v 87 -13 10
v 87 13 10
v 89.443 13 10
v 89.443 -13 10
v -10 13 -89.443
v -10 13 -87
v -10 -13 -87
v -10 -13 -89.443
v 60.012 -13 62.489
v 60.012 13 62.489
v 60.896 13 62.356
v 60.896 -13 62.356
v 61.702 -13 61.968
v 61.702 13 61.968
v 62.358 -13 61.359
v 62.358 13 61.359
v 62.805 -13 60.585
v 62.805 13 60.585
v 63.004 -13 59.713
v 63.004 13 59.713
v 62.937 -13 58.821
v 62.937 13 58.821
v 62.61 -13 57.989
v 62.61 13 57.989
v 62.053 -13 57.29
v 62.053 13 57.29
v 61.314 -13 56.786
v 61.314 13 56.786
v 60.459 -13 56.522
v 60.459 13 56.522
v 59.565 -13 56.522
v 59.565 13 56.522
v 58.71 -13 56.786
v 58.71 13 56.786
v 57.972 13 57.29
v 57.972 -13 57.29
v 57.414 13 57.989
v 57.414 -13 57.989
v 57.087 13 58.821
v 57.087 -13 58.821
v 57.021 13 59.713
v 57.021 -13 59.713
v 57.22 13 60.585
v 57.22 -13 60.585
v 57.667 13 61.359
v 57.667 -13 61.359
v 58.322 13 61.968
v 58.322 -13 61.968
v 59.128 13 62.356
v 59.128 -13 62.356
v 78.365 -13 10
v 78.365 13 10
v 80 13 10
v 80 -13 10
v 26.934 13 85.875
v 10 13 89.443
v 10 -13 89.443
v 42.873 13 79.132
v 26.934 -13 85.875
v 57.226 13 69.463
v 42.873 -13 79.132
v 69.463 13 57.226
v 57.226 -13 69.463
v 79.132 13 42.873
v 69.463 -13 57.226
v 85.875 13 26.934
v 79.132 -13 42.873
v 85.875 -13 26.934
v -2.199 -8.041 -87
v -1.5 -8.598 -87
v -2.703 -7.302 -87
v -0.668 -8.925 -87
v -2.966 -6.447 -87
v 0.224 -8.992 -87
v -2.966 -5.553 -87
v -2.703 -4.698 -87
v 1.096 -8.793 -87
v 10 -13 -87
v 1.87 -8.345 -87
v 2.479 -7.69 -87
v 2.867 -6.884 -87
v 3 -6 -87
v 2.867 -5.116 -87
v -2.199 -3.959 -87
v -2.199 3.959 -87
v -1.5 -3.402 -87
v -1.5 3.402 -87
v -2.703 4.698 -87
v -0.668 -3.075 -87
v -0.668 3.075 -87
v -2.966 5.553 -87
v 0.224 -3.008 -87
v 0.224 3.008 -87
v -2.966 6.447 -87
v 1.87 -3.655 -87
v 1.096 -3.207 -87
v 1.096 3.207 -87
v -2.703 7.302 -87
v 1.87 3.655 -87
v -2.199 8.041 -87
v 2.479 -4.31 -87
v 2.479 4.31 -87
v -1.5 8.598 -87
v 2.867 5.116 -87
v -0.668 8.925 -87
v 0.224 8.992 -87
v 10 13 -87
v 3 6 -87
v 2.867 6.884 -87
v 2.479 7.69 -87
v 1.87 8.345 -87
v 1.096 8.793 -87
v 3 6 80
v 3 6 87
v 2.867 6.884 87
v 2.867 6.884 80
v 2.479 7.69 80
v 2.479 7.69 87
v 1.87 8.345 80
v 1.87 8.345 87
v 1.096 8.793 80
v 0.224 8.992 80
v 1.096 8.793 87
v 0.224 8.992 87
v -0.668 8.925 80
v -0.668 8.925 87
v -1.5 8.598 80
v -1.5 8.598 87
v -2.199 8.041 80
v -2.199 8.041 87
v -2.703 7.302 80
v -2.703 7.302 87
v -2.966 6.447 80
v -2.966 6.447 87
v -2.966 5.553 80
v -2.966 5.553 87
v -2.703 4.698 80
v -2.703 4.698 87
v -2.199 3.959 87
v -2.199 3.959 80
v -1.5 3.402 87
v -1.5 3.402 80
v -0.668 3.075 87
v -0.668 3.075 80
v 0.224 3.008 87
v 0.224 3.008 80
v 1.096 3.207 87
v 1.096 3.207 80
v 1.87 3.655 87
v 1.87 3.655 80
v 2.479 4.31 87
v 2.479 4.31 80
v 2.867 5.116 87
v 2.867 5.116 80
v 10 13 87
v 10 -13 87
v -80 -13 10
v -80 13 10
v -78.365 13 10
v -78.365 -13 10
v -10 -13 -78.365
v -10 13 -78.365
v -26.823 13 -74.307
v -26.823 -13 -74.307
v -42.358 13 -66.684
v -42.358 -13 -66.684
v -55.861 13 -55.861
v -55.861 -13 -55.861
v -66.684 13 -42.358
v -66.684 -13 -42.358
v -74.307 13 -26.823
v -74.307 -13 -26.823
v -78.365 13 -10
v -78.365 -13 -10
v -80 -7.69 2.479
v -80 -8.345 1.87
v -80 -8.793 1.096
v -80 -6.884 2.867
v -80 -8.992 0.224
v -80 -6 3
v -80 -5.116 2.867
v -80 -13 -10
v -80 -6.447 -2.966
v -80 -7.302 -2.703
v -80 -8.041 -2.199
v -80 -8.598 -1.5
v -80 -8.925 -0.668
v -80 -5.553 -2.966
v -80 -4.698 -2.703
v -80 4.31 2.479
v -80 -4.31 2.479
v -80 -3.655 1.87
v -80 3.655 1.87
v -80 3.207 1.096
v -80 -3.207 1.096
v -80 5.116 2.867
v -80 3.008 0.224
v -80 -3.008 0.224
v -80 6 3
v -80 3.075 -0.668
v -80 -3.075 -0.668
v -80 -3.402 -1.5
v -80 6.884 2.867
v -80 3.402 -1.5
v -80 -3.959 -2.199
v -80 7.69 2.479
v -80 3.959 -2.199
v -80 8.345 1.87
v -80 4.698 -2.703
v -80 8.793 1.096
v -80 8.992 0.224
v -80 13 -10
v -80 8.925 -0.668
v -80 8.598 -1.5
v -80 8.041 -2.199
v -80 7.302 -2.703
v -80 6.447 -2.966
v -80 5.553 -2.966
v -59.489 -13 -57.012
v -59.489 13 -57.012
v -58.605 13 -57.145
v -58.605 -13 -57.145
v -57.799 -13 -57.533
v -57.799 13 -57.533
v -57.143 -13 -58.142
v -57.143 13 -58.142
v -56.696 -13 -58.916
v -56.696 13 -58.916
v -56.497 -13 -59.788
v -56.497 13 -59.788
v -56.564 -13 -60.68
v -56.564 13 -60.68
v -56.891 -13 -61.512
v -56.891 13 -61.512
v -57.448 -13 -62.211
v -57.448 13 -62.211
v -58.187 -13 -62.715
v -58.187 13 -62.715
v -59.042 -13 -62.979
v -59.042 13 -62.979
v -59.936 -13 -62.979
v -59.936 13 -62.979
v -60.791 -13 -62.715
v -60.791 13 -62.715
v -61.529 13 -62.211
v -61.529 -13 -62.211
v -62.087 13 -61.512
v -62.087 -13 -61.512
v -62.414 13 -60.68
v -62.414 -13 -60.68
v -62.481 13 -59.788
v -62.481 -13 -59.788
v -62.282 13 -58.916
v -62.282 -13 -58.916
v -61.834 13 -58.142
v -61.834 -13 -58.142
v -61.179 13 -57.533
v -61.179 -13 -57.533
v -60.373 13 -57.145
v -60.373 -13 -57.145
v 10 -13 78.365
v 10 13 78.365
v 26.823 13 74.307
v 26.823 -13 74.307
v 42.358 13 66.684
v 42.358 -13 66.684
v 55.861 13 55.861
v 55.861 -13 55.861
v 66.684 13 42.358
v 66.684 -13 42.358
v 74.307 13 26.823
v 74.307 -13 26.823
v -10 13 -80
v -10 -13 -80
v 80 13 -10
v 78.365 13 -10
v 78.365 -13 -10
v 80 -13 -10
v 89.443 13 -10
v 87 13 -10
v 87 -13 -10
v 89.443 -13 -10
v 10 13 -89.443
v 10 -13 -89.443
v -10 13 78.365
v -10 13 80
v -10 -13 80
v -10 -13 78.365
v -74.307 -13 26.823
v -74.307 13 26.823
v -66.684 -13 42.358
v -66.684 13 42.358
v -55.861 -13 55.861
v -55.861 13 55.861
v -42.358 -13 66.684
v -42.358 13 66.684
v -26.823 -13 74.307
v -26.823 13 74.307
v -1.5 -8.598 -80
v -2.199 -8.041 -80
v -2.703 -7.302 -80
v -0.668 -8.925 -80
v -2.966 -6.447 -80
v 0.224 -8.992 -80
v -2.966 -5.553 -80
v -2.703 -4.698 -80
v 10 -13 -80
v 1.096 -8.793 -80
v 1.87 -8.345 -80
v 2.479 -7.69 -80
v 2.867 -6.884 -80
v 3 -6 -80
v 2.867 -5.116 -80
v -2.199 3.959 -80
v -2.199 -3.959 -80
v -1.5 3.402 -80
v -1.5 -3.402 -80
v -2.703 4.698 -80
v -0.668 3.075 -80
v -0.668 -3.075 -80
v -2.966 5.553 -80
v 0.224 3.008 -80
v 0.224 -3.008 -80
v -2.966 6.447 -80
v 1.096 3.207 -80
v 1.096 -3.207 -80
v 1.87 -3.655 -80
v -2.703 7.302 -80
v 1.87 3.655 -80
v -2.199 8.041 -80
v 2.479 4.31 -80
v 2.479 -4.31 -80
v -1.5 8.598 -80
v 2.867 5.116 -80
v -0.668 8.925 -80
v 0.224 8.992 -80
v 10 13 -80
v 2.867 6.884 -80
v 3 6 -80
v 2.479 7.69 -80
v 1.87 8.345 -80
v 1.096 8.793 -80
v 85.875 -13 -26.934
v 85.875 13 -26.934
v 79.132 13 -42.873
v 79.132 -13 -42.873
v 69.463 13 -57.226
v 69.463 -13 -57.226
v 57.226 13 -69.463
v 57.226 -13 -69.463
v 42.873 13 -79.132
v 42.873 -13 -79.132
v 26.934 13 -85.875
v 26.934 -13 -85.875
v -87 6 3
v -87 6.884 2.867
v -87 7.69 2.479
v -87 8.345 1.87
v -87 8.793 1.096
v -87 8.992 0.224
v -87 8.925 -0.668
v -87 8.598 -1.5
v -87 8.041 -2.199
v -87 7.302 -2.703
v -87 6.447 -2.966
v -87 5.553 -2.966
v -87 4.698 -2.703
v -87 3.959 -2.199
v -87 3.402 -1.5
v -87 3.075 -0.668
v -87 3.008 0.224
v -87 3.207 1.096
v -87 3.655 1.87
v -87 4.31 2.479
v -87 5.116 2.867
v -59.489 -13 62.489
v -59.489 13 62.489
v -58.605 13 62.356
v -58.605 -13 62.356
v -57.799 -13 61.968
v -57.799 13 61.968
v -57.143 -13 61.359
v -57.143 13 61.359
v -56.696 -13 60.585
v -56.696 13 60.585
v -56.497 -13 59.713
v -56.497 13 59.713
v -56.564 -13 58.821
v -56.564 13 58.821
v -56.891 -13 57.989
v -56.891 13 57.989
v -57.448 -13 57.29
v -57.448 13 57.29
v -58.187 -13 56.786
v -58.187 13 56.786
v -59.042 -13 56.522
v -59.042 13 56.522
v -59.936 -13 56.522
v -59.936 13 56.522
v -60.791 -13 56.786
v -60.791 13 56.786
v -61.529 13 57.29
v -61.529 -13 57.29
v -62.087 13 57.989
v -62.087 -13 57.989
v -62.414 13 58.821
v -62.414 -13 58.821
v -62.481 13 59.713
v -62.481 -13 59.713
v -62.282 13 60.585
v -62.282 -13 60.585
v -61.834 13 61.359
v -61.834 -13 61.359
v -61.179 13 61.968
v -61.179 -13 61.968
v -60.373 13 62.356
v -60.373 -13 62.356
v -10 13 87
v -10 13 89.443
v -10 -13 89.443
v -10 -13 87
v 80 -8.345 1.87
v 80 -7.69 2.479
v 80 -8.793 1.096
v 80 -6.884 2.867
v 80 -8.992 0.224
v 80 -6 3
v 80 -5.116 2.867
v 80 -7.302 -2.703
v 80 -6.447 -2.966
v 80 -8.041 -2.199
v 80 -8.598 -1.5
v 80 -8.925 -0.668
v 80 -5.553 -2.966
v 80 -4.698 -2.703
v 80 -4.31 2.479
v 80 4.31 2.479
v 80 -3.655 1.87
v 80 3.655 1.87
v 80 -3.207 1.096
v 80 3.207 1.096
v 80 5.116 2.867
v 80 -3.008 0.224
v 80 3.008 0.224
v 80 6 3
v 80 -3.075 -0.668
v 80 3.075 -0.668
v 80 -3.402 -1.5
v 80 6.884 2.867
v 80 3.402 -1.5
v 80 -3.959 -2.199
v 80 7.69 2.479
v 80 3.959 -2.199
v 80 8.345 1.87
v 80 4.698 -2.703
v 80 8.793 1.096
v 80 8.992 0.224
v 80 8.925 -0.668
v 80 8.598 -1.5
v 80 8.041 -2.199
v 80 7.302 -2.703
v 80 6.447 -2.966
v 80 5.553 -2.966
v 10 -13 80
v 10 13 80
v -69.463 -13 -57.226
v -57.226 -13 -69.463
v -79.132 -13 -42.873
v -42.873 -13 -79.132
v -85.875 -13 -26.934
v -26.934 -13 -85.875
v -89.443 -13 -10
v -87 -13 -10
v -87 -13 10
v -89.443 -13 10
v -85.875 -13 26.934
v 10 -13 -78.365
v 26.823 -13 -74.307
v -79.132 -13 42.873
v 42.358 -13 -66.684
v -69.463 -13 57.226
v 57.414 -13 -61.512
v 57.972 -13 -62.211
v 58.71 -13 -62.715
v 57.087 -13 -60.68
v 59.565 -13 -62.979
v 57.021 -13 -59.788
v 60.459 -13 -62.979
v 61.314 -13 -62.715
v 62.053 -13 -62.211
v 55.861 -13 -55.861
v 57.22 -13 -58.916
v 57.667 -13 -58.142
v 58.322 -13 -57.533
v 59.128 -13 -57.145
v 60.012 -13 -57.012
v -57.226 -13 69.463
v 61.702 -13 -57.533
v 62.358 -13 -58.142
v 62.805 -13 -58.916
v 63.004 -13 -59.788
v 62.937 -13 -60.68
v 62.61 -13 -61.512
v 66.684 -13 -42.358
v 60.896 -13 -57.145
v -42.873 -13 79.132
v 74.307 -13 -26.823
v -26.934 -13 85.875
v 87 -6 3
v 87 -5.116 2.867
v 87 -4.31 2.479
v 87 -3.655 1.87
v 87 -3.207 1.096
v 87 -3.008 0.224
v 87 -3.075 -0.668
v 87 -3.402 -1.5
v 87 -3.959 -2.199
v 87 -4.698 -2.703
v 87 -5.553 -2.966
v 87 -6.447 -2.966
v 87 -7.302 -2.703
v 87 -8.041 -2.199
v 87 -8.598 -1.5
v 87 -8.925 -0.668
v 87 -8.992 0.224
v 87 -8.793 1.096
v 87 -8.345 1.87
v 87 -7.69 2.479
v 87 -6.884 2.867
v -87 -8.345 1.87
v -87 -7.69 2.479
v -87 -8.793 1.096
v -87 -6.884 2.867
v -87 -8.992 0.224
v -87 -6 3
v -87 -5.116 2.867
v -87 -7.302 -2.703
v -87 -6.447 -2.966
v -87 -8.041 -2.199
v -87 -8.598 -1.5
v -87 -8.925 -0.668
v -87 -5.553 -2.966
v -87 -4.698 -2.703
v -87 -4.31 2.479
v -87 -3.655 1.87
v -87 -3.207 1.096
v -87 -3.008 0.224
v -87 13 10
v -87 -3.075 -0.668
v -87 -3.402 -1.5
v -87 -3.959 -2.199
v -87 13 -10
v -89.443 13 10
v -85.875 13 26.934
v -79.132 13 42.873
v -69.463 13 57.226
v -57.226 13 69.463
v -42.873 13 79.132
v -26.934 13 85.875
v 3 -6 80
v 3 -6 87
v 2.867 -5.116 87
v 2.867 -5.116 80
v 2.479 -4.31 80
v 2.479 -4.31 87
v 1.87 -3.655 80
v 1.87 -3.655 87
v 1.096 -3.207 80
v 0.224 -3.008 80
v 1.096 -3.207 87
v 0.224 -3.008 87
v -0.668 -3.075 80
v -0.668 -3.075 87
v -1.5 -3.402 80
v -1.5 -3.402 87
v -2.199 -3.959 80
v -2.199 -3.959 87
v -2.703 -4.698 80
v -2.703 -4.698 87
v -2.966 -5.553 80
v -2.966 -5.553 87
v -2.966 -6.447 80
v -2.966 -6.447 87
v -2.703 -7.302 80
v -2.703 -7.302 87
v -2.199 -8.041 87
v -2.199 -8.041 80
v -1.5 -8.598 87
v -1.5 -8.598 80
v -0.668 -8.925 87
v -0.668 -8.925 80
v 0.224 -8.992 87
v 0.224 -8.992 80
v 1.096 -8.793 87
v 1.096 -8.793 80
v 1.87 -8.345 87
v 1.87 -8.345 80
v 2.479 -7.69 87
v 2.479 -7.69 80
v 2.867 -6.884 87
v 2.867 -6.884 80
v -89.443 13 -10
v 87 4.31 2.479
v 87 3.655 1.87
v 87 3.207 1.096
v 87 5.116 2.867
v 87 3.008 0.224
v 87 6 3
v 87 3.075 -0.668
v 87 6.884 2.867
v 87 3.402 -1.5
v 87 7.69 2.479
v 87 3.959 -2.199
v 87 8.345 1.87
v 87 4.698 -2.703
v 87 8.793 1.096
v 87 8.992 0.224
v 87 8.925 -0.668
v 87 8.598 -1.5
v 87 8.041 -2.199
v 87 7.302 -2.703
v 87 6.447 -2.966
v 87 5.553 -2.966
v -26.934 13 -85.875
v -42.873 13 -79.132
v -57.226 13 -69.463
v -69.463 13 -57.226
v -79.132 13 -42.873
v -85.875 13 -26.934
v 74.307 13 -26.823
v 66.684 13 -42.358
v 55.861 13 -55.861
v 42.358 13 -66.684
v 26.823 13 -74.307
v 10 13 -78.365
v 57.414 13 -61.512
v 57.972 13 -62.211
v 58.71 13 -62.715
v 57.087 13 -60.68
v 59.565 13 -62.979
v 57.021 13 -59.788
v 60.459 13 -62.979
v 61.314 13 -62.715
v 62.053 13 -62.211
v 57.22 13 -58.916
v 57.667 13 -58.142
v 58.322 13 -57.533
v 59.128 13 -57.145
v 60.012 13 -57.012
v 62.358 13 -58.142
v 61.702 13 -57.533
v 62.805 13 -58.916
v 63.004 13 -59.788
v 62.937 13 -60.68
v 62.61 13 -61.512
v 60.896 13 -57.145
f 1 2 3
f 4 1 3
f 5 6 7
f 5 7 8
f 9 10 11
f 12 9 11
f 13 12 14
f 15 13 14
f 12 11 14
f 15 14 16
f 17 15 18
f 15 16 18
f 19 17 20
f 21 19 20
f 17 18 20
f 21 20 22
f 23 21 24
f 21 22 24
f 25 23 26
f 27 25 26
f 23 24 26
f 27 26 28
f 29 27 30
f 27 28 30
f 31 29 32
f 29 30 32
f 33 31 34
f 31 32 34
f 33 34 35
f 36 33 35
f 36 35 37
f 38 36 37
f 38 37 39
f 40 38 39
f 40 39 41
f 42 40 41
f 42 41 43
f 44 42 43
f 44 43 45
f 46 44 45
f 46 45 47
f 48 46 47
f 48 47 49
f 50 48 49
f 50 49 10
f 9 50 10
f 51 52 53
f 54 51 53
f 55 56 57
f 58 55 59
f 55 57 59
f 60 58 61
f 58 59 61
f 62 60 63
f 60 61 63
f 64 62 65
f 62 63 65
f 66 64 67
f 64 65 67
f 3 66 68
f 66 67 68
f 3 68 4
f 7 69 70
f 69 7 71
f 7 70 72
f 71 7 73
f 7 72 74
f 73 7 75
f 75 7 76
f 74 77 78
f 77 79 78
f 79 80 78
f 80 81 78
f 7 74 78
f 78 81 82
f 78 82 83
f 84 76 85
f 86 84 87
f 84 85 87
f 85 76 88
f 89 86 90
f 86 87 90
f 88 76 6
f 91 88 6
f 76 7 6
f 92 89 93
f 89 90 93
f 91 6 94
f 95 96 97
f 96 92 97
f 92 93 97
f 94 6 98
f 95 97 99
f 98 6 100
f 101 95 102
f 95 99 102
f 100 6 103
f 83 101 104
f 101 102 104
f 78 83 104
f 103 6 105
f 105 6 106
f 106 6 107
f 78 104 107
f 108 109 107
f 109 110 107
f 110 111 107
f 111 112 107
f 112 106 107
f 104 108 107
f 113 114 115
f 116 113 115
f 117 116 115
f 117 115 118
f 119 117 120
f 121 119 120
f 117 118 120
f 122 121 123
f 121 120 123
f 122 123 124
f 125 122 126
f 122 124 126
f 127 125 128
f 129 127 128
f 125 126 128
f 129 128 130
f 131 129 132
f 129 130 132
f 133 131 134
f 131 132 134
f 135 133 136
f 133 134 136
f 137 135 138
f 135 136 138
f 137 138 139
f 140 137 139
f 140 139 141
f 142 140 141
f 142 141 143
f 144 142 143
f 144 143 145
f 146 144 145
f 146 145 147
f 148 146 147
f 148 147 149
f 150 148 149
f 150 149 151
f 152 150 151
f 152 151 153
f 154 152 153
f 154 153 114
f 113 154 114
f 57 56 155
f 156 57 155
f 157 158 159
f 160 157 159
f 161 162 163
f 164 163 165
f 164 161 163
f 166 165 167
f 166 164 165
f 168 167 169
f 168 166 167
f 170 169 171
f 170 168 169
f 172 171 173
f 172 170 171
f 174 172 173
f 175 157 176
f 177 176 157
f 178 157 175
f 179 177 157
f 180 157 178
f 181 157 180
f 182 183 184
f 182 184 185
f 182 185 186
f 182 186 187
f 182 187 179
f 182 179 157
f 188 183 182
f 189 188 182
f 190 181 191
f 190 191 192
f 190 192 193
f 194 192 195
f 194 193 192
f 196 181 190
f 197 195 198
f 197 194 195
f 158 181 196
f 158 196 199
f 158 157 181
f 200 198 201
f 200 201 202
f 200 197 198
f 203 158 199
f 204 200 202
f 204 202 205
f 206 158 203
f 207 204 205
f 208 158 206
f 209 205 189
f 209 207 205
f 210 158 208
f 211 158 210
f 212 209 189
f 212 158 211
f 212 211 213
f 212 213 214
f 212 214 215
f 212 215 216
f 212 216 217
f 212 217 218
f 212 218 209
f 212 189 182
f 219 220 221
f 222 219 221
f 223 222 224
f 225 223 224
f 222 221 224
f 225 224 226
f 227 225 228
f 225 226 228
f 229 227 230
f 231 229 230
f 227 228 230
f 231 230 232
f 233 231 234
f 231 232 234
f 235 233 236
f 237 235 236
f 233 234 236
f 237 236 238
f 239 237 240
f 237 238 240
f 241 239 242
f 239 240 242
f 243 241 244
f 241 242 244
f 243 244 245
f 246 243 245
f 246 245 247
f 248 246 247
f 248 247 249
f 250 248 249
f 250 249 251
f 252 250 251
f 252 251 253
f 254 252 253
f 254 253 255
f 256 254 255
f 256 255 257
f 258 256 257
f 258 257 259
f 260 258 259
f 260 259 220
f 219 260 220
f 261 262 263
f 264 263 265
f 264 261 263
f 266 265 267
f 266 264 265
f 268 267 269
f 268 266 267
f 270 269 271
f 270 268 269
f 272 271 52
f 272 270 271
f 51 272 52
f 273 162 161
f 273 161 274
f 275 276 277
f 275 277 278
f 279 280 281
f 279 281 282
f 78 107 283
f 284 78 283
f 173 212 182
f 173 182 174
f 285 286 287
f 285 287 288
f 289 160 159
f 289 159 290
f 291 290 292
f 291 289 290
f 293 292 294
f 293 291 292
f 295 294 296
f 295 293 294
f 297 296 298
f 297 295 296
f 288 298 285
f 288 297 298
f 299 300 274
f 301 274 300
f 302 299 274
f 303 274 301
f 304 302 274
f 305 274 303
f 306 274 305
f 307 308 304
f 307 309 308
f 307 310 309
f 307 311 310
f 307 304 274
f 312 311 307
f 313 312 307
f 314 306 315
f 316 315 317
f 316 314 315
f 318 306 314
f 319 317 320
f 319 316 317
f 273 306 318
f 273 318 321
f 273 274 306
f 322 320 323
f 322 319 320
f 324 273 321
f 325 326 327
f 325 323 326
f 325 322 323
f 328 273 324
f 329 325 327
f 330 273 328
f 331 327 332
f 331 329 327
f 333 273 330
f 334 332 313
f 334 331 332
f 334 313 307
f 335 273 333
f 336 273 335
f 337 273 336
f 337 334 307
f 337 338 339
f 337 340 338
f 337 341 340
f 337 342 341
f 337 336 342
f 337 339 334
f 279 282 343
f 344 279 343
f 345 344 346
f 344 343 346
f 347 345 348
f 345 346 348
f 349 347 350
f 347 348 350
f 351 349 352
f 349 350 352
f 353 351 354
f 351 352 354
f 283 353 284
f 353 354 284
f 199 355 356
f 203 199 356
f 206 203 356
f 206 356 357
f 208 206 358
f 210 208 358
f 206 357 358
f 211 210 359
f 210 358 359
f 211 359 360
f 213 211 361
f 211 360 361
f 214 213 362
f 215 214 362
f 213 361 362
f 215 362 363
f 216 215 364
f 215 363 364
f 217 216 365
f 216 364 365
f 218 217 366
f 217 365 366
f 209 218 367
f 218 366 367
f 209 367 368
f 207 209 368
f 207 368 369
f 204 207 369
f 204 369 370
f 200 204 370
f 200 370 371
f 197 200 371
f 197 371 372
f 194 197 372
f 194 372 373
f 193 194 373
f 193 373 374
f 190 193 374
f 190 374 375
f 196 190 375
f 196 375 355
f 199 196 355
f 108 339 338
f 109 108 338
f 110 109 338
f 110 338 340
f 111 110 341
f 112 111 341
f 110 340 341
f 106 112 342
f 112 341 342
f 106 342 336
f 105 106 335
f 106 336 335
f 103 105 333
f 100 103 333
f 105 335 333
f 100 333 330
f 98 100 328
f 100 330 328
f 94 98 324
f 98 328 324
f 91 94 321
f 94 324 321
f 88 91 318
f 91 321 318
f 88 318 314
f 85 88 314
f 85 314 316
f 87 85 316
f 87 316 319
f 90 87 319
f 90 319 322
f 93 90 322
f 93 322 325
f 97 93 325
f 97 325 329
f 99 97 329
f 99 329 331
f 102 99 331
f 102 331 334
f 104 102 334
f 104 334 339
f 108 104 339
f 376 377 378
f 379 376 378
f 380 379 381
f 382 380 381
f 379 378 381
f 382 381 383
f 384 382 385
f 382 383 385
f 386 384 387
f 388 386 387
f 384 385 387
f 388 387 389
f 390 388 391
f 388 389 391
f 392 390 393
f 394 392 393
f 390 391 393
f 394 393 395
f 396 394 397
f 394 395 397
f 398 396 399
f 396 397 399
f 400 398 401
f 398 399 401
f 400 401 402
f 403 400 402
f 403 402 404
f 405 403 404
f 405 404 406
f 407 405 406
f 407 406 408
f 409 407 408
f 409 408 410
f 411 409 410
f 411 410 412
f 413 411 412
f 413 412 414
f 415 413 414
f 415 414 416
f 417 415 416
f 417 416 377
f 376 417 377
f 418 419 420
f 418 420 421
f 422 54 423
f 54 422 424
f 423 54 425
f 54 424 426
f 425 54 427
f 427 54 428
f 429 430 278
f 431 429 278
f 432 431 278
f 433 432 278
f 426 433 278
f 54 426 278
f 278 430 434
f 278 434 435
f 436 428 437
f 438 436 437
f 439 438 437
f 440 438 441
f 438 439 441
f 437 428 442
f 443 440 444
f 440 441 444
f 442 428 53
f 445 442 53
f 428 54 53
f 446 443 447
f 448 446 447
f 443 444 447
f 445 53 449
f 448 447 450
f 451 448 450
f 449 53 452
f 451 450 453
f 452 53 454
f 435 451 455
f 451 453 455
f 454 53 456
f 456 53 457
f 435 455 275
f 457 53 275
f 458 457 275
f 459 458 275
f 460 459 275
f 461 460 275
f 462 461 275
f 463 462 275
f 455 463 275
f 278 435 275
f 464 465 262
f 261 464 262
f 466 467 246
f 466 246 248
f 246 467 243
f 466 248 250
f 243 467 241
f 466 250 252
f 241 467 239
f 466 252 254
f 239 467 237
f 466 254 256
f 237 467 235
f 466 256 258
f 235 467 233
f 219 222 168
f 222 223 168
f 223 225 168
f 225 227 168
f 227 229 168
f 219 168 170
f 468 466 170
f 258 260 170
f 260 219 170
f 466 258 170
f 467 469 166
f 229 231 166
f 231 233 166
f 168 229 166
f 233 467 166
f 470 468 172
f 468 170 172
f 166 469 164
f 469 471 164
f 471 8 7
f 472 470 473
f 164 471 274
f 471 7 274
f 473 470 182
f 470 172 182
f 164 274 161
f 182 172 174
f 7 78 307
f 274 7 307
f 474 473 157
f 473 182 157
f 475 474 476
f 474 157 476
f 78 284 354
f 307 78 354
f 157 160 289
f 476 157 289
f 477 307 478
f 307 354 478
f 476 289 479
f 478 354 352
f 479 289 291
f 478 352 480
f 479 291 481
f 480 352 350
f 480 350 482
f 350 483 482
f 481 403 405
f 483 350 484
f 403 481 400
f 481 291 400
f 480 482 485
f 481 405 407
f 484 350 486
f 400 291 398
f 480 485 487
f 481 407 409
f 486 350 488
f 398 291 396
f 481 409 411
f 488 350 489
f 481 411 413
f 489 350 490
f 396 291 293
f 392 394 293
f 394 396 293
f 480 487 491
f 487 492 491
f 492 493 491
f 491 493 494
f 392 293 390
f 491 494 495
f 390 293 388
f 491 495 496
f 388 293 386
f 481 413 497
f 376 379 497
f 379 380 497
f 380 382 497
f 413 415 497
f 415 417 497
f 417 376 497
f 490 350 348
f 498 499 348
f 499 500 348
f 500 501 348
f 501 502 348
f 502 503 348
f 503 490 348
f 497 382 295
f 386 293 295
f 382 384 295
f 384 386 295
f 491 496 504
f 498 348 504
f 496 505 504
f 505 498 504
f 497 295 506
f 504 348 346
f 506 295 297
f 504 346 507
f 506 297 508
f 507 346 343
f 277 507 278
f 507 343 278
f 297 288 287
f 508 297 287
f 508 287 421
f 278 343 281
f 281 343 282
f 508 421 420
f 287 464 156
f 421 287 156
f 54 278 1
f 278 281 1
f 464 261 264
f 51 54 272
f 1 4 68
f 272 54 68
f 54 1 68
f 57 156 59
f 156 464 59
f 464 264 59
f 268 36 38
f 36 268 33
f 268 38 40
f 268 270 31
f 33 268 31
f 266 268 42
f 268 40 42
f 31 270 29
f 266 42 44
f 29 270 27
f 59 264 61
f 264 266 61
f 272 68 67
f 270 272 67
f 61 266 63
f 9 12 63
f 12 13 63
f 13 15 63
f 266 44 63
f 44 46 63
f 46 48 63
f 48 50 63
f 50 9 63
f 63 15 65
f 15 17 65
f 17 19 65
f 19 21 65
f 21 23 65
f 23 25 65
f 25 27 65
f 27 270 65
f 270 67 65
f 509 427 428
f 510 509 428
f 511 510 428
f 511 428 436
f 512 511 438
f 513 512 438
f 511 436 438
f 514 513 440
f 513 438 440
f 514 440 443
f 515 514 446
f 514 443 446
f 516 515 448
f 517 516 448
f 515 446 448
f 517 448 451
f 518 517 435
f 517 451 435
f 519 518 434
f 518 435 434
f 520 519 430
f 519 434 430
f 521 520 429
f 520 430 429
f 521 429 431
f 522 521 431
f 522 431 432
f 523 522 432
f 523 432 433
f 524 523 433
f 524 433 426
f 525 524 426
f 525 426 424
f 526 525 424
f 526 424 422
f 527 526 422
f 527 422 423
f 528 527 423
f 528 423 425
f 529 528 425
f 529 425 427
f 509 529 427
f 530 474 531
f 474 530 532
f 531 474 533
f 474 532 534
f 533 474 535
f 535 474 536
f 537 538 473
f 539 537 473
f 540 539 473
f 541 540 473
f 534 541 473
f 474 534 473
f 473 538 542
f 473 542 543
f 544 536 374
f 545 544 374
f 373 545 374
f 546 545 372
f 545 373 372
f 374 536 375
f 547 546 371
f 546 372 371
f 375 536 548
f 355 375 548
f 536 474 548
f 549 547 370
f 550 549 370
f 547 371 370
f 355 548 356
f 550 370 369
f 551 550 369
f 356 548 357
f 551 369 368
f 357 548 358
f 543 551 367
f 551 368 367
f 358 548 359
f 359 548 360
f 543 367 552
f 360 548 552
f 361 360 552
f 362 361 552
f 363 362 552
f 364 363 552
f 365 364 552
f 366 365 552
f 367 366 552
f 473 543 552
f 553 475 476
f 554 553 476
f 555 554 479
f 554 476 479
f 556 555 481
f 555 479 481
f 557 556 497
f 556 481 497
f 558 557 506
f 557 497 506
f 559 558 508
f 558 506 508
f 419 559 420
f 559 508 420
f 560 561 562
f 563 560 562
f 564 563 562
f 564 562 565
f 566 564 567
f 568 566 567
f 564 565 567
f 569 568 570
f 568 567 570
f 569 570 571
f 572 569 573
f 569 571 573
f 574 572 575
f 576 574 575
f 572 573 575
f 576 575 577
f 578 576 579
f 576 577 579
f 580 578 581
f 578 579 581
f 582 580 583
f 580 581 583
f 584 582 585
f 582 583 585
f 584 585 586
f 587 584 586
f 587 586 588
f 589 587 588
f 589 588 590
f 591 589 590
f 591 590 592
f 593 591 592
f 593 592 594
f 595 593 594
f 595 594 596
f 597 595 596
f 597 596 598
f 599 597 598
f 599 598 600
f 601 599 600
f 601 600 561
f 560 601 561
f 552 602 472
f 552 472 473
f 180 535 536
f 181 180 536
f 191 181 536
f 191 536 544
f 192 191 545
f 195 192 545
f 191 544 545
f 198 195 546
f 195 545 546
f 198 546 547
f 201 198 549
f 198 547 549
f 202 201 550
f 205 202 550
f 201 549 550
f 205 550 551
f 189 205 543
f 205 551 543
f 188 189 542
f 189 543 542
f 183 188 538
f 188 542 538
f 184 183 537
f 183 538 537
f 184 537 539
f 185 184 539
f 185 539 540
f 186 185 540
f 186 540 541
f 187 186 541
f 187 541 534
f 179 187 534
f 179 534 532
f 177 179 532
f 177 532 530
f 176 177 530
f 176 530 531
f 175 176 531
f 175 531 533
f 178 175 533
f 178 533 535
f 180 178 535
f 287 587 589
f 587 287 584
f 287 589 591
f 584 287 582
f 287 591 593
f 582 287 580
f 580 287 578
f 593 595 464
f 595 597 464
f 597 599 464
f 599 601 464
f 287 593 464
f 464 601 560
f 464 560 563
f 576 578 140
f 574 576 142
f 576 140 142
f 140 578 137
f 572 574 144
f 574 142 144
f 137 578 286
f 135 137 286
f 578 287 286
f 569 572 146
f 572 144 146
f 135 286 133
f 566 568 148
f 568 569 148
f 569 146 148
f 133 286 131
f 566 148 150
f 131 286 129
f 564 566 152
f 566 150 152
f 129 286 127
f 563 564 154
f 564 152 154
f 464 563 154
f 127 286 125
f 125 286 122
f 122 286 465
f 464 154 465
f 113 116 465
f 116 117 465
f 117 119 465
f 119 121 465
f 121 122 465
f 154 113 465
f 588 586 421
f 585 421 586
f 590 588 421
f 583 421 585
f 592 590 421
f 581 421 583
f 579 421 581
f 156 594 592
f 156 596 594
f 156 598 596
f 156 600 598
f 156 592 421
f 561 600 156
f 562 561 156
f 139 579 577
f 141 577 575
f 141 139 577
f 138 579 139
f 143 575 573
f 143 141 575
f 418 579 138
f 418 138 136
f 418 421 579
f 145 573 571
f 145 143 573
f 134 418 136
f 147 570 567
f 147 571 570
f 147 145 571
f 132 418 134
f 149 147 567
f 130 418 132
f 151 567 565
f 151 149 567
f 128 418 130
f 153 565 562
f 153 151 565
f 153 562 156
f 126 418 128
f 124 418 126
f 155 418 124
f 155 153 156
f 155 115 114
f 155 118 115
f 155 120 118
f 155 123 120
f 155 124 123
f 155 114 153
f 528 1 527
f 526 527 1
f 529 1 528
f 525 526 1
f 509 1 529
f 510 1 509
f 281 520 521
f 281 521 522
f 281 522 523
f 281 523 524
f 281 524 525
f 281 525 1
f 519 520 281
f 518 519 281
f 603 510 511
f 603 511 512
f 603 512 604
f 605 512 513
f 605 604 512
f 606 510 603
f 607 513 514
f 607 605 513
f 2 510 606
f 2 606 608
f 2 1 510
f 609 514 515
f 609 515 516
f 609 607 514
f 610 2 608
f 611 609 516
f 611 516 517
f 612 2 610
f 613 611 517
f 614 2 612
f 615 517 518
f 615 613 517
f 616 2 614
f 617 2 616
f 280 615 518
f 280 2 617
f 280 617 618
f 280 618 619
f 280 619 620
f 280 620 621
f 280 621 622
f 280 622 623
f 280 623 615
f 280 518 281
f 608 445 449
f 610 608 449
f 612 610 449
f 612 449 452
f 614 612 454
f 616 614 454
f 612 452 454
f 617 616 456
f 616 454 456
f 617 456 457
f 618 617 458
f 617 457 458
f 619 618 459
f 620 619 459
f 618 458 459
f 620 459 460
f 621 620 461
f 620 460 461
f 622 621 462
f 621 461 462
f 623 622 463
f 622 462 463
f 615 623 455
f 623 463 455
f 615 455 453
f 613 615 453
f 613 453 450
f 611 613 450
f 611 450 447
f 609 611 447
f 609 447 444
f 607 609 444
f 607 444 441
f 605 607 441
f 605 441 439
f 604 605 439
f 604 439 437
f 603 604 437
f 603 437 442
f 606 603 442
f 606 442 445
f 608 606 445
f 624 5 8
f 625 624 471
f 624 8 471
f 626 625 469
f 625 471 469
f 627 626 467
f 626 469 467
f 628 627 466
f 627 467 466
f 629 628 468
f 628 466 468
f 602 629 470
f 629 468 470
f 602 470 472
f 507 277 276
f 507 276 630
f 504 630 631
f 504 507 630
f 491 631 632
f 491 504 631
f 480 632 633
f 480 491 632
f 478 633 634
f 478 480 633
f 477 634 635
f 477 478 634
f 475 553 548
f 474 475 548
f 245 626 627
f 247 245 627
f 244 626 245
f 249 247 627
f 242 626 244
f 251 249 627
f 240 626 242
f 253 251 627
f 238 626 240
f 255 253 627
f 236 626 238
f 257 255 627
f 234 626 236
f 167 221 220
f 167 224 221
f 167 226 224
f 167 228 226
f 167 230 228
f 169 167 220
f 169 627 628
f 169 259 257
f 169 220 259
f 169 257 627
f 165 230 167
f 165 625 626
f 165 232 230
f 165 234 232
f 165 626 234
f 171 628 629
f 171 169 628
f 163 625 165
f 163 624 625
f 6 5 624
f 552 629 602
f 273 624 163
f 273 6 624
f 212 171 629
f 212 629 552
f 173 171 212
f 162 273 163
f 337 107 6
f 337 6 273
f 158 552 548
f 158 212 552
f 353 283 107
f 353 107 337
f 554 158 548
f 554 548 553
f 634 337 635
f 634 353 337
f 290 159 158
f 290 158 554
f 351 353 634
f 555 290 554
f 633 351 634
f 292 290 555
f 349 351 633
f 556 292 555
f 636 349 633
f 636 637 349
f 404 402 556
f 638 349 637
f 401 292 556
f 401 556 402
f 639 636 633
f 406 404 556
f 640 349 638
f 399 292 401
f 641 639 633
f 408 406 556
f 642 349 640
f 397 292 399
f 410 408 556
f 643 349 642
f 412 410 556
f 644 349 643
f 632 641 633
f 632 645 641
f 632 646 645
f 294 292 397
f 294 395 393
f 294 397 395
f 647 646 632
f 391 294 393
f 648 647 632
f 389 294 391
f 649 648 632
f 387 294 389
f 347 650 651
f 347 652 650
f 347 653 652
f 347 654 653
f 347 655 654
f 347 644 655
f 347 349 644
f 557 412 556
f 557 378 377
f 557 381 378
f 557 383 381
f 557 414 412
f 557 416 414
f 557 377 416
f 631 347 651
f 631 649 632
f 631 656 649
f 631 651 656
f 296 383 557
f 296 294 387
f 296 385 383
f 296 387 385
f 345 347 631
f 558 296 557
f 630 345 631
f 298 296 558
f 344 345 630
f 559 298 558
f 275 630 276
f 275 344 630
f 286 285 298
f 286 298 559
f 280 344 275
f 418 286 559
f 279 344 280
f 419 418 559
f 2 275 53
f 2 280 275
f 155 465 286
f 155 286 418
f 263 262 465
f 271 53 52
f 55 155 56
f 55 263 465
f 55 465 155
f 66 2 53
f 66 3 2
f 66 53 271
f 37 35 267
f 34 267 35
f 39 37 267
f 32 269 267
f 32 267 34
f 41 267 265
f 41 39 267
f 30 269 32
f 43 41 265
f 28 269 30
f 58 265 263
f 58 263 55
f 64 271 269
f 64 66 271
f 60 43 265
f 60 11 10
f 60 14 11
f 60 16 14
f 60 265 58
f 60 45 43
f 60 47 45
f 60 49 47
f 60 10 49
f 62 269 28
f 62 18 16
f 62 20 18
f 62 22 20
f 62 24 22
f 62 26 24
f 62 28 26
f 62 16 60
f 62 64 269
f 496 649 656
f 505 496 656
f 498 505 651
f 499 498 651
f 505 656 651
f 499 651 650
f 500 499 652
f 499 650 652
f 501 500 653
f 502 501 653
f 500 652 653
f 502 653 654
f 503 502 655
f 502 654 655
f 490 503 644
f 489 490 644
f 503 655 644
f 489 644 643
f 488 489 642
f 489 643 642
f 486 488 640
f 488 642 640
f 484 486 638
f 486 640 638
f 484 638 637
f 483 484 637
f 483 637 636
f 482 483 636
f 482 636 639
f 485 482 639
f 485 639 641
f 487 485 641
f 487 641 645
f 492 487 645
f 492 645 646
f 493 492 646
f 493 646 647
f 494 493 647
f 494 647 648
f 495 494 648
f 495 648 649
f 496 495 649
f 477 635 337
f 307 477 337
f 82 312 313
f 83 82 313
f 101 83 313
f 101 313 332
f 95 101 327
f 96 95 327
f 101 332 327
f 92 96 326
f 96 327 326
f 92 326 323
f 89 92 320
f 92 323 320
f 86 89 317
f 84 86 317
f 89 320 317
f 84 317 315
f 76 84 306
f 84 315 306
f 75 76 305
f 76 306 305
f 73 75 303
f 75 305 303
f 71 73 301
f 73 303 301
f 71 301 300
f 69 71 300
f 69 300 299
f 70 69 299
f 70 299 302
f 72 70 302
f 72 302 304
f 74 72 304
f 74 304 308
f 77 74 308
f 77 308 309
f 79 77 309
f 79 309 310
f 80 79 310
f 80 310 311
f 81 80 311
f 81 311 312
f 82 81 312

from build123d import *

# Parameters (mm, degrees)
BOSS_EXTRUDE1_DEPTH      = 13
BOSS_EXTRUDE1_DEPTH_BACK = 13
SKETCH1_R                = 90
SKETCH1_R_2              = 79
SKETCH5_R                = 3
CUT_EXTRUDE3_DEPTH       = 130.907659512
SKETCH6_W                = 20
SKETCH6_H                = 3
SKETCH6_W_2              = 3
SKETCH6_H_2              = 20
CUT_EXTRUDE4_DEPTH       = 130.907659512
SKETCH7_R                = 3
CUT_EXTRUDE5_DEPTH       = 199.244881708
SKETCH12_R               = 3
CUT_EXTRUDE8_DEPTH       = 199.244881715
SKETCH13_W               = 20
SKETCH13_H               = 3
SKETCH13_W_2             = 3
SKETCH13_H_2             = 20
CUT_EXTRUDE9_DEPTH       = 130.135587679


with BuildPart() as part:
    # Sketch1 → Boss-Extrude1 (new, two sides: drawn at the far end of the back side and taken through both)
    with BuildSketch(Plane(origin=(0, 0, 0), x_dir=(1, 0, 0), z_dir=(0, 1, 0)).offset(-BOSS_EXTRUDE1_DEPTH_BACK)):
        Circle(SKETCH1_R)
        Circle(SKETCH1_R_2, mode=Mode.SUBTRACT)
    extrude(amount=BOSS_EXTRUDE1_DEPTH + BOSS_EXTRUDE1_DEPTH_BACK)

    # Sketch5 → Cut-Extrude3 (cut, through all)
    with BuildSketch(Plane(origin=(0, 13, 0), x_dir=(1, 0, 0), z_dir=(0, 1, 0))):
        with Locations((60.012131098, 60.012131098)):
            Circle(SKETCH5_R)
        with Locations((60.012131098, -59.488914922)):
            Circle(SKETCH5_R)
        with Locations((-59.488914922, -59.488914922)):
            Circle(SKETCH5_R)
        with Locations((-59.488914922, 60.012131098)):
            Circle(SKETCH5_R)
    extrude(amount=-CUT_EXTRUDE3_DEPTH, mode=Mode.SUBTRACT)

    # Sketch6 → Cut-Extrude4 (cut, through all)
    with BuildSketch(Plane(origin=(0, 13, 0), x_dir=(1, 0, 0), z_dir=(0, 1, 0))):
        with Locations((0, -88.5)):
            Rectangle(SKETCH6_W, SKETCH6_H)
        with Locations((0, 88.5)):
            Rectangle(SKETCH6_W, SKETCH6_H)
        with Locations((88.5, 0)):
            Rectangle(SKETCH6_W_2, SKETCH6_H_2)
        with Locations((-88.5, 0)):
            Rectangle(SKETCH6_W_2, SKETCH6_H_2)
    extrude(amount=-CUT_EXTRUDE4_DEPTH, mode=Mode.SUBTRACT)

    # Sketch7 → Cut-Extrude5 (cut, through all)
    with BuildSketch(Plane.ZY.offset(87)):
        with Locations((0, 6)):
            Circle(SKETCH7_R)
        with Locations((0, -6)):
            Circle(SKETCH7_R)
    extrude(amount=-CUT_EXTRUDE5_DEPTH, mode=Mode.SUBTRACT)

    # Sketch12 → Cut-Extrude8 (cut, through all)
    with BuildSketch(Plane.XY.offset(87)):
        with Locations((0, 6)):
            Circle(SKETCH12_R)
        with Locations((0, -6)):
            Circle(SKETCH12_R)
    extrude(amount=-CUT_EXTRUDE8_DEPTH, mode=Mode.SUBTRACT)

    # Sketch13 → Cut-Extrude9 (cut, through all)
    with BuildSketch(Plane(origin=(0, 13, 0), x_dir=(1, 0, 0), z_dir=(0, 1, 0))):
        with Locations((0, -78.5)):
            Rectangle(SKETCH13_W, SKETCH13_H)
        with Locations((0, 78.5)):
            Rectangle(SKETCH13_W, SKETCH13_H)
        with Locations((-78.5, 0)):
            Rectangle(SKETCH13_W_2, SKETCH13_H_2)
        with Locations((78.5, 0)):
            Rectangle(SKETCH13_W_2, SKETCH13_H_2)
    extrude(amount=-CUT_EXTRUDE9_DEPTH, mode=Mode.SUBTRACT)


solid = part.part
